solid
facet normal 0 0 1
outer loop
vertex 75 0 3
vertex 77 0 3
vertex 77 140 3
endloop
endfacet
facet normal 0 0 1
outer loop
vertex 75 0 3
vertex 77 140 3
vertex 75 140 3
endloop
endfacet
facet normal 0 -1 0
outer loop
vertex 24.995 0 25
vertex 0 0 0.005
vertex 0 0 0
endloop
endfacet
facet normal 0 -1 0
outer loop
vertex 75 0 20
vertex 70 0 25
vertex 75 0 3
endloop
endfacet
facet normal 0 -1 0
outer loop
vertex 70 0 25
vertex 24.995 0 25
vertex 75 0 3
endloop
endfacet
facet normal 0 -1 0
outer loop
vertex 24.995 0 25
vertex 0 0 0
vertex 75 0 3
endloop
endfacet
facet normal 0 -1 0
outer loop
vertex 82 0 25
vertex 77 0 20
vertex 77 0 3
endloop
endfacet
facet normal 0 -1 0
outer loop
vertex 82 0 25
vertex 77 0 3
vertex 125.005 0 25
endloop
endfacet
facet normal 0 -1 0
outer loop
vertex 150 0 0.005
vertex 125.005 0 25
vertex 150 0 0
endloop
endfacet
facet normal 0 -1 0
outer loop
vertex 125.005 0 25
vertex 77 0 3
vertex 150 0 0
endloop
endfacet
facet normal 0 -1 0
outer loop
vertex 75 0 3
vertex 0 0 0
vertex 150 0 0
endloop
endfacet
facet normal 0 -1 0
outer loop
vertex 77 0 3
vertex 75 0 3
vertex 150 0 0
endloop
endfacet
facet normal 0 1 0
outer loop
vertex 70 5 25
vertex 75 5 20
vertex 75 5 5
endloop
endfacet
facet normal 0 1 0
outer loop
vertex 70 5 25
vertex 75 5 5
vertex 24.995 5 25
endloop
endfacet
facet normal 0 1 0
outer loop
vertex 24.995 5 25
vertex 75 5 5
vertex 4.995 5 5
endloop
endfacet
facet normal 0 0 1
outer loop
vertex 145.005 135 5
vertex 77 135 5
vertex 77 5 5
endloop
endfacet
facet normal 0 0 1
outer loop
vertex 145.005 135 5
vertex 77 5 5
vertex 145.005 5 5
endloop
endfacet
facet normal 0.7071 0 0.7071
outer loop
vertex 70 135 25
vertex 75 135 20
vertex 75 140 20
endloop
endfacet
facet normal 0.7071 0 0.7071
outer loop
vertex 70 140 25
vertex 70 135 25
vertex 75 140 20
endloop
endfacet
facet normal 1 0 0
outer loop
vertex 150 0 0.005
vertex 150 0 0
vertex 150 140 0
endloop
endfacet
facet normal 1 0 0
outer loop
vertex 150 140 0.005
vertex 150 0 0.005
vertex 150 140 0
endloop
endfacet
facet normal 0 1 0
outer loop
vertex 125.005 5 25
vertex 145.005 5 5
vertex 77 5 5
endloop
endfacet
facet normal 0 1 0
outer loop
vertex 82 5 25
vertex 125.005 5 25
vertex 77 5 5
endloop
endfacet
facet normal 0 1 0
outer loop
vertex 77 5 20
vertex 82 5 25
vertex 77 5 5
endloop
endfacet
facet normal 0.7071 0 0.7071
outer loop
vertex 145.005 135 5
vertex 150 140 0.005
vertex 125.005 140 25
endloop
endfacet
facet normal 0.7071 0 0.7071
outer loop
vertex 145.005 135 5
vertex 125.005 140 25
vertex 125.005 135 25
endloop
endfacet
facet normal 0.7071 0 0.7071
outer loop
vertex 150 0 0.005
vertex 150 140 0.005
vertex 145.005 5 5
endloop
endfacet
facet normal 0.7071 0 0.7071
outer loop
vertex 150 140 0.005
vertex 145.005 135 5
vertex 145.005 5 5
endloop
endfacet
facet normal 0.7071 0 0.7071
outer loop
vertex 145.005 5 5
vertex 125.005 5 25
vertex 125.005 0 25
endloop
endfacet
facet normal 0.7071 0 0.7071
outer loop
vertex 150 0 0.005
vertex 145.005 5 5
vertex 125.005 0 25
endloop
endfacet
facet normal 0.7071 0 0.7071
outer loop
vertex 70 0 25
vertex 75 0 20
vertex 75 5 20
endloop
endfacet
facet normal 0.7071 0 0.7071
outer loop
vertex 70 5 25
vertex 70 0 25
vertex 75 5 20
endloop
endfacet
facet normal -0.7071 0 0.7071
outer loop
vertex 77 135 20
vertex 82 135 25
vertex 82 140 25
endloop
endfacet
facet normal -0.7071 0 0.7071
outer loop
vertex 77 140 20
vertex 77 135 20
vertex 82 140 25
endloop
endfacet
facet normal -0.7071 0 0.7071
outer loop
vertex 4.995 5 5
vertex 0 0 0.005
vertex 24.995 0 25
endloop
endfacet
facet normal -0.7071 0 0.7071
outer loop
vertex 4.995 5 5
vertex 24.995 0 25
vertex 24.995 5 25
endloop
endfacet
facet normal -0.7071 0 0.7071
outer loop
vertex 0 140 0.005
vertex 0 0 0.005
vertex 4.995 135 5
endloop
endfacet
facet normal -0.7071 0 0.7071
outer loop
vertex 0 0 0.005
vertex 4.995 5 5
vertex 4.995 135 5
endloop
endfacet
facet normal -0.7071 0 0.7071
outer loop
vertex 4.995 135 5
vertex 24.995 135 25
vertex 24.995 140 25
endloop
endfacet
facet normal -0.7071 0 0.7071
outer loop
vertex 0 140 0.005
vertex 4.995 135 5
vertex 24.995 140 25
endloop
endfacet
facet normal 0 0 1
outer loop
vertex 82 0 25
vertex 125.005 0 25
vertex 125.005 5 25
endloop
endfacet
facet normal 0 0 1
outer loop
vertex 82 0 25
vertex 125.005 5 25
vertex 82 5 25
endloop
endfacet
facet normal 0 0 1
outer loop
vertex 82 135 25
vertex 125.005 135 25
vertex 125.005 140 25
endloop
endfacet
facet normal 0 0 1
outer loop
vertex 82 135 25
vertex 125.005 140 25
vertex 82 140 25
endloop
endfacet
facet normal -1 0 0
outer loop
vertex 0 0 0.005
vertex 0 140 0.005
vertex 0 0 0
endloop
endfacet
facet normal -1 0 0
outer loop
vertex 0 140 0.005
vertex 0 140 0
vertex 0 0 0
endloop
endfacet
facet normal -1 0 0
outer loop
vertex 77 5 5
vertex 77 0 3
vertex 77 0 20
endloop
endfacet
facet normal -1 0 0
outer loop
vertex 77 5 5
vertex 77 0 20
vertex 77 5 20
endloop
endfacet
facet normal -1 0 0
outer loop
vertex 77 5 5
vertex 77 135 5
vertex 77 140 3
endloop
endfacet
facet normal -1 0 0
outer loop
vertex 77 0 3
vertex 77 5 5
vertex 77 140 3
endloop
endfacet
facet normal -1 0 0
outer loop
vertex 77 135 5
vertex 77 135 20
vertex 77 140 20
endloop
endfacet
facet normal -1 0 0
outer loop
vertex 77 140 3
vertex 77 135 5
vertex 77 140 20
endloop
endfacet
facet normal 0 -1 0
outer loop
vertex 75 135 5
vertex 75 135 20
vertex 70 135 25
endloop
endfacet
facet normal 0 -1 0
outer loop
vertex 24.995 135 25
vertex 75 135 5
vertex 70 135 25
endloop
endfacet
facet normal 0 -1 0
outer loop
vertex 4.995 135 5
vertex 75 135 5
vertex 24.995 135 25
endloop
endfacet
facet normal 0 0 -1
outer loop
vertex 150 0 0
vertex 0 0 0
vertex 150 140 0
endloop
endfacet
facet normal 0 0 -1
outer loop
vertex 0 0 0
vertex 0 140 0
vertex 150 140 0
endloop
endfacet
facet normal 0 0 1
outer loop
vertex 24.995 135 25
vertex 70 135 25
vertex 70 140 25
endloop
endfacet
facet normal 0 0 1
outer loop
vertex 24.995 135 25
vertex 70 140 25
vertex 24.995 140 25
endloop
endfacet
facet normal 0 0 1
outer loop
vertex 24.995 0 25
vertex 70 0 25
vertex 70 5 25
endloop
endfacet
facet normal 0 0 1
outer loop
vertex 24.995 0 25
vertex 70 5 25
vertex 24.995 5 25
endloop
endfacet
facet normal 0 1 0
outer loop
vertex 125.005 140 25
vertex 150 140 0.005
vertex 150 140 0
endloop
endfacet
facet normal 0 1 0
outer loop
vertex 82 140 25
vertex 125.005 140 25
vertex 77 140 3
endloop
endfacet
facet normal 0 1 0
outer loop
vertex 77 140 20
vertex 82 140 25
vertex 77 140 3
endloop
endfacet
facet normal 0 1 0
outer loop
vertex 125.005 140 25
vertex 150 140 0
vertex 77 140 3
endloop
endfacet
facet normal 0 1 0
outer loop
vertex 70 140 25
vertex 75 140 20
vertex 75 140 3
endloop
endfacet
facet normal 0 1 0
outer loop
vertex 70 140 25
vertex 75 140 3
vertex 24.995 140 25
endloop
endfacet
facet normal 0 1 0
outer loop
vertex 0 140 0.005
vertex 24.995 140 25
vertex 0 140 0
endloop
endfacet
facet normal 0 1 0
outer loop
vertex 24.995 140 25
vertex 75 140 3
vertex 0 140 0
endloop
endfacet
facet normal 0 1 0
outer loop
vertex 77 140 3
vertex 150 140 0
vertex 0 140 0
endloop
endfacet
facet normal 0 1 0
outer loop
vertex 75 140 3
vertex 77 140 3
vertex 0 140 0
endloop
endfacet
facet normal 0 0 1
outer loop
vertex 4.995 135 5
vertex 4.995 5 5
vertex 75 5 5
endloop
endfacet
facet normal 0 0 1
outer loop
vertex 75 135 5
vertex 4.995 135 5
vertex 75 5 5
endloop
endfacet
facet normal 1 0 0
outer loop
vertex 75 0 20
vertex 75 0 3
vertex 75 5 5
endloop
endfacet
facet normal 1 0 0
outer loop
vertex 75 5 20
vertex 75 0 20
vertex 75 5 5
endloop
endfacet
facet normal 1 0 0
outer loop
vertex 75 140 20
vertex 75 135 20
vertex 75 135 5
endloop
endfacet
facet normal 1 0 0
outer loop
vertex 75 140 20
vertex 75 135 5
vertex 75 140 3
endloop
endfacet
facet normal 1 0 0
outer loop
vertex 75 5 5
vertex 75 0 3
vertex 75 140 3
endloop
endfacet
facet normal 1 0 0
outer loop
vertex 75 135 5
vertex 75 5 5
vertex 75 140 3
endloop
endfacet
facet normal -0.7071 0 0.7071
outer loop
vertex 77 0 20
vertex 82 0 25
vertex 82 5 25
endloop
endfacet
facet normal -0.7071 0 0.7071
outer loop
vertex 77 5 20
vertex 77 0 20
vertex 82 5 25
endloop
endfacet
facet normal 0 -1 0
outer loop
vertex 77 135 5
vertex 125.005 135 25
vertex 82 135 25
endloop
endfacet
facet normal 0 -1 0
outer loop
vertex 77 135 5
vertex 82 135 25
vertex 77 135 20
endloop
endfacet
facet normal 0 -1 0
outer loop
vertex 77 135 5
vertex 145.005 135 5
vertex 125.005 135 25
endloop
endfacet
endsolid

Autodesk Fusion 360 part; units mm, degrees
sketch "Sketch1" plane through (0, 0, 0) normal (0, 0, 1) x (1, 0, 0)
  line L0 (0, 0) -> (150, 0)
  line L1 (150, 0) -> (150, 140)
  line L2 (150, 140) -> (0, 140)
  line L3 (0, 140) -> (0, 0)
  dimension "d1" = 150
  dimension "d2" = 140
extrude "Extrude1" add sketch "Sketch1" along normal blind 5
sketch "Sketch2" plane through (0, 0, 5) normal (0, 0, 1) x (-1, 0, 0)
  line L0 (0, -140) -> (0, 0)
  line L1 (0, 0) -> (-150, 0)
  line L2 (-150, 0) -> (-150, -140)
  line L3 (-150, -140) -> (0, -140)
  line L4 (0, -140) -> (-150, -140)
  line L5 (-150, -140) -> (-150, -135)
  line L6 (-150, -135) -> (0, -135)
  line L7 (0, -135) -> (0, -140)
  line L8 (0, 0) -> (-150, 0)
  line L9 (-150, 0) -> (-150, -5)
  line L10 (-150, -5) -> (0, -5)
  line L11 (0, -5) -> (0, 0)
  line L12 (-75, -140) -> (-77, -140)
  line L13 (-77, -140) -> (-77, -135)
  line L14 (-77, -135) -> (-75, -135)
  line L15 (-75, -135) -> (-75, -140)
  line L16 (-75, 0) -> (-77, 0)
  line L17 (-77, 0) -> (-77, -5)
  line L18 (-77, -5) -> (-75, -5)
  line L19 (-75, -5) -> (-75, 0)
  dimension "d5" = 2
  dimension "d6" = 5
  dimension "d7" = 2
  dimension "d8" = 5
extrude "Extrude2" add sketch "Sketch2" along normal blind 20 contours L0 L3 L4 L6 L7 L15 | L0 L1 L8 L10 L11 L19 | L2 L3 L4 L5 L6 L13 | L1 L2 L8 L9 L10 L17
sketch "Sketch3" plane through (0, 0, 5) normal (0, 0, 1) x (-1, 0, 0)
  line L0 (-77, -5) -> (-150, -5)
  line L1 (-150, -5) -> (-150, -135)
  line L2 (-150, -135) -> (-77, -135)
  line L3 (-77, -135) -> (-77, -140)
  line L4 (-77, -140) -> (-75, -140)
  line L5 (-75, -140) -> (-75, -135)
  line L6 (-75, -135) -> (0, -135)
  line L7 (0, -135) -> (0, -5)
  line L8 (0, -5) -> (-75, -5)
  line L9 (-75, -5) -> (-75, 0)
  line L10 (-75, 0) -> (-77, 0)
  line L11 (-77, 0) -> (-77, -5)
  line L12 (-75, -140) -> (-77, -140)
  line L13 (-77, -140) -> (-77, 0)
  line L14 (-77, 0) -> (-75, 0)
  line L15 (-75, 0) -> (-75, -140)
  dimension "d11" = 2
  dimension "d12" = 140
extrude "Extrude3" cut sketch "Sketch3" against normal blind 2 contours L3 L4 L5 L9 L10 L11 L12 L13 L14 L15
chamfer "Chamfer1" distance 5 angle 45 4 edges at (75, 2.5, 25) (77, 2.5, 25) (75, 137.5, 25) (77, 137.5, 25)
chamfer "Chamfer2" distance 25 angle 45 4 edges at (150, 2.5, 25) (150, 137.5, 25) (0, 2.5, 25) (0, 137.5, 25)
